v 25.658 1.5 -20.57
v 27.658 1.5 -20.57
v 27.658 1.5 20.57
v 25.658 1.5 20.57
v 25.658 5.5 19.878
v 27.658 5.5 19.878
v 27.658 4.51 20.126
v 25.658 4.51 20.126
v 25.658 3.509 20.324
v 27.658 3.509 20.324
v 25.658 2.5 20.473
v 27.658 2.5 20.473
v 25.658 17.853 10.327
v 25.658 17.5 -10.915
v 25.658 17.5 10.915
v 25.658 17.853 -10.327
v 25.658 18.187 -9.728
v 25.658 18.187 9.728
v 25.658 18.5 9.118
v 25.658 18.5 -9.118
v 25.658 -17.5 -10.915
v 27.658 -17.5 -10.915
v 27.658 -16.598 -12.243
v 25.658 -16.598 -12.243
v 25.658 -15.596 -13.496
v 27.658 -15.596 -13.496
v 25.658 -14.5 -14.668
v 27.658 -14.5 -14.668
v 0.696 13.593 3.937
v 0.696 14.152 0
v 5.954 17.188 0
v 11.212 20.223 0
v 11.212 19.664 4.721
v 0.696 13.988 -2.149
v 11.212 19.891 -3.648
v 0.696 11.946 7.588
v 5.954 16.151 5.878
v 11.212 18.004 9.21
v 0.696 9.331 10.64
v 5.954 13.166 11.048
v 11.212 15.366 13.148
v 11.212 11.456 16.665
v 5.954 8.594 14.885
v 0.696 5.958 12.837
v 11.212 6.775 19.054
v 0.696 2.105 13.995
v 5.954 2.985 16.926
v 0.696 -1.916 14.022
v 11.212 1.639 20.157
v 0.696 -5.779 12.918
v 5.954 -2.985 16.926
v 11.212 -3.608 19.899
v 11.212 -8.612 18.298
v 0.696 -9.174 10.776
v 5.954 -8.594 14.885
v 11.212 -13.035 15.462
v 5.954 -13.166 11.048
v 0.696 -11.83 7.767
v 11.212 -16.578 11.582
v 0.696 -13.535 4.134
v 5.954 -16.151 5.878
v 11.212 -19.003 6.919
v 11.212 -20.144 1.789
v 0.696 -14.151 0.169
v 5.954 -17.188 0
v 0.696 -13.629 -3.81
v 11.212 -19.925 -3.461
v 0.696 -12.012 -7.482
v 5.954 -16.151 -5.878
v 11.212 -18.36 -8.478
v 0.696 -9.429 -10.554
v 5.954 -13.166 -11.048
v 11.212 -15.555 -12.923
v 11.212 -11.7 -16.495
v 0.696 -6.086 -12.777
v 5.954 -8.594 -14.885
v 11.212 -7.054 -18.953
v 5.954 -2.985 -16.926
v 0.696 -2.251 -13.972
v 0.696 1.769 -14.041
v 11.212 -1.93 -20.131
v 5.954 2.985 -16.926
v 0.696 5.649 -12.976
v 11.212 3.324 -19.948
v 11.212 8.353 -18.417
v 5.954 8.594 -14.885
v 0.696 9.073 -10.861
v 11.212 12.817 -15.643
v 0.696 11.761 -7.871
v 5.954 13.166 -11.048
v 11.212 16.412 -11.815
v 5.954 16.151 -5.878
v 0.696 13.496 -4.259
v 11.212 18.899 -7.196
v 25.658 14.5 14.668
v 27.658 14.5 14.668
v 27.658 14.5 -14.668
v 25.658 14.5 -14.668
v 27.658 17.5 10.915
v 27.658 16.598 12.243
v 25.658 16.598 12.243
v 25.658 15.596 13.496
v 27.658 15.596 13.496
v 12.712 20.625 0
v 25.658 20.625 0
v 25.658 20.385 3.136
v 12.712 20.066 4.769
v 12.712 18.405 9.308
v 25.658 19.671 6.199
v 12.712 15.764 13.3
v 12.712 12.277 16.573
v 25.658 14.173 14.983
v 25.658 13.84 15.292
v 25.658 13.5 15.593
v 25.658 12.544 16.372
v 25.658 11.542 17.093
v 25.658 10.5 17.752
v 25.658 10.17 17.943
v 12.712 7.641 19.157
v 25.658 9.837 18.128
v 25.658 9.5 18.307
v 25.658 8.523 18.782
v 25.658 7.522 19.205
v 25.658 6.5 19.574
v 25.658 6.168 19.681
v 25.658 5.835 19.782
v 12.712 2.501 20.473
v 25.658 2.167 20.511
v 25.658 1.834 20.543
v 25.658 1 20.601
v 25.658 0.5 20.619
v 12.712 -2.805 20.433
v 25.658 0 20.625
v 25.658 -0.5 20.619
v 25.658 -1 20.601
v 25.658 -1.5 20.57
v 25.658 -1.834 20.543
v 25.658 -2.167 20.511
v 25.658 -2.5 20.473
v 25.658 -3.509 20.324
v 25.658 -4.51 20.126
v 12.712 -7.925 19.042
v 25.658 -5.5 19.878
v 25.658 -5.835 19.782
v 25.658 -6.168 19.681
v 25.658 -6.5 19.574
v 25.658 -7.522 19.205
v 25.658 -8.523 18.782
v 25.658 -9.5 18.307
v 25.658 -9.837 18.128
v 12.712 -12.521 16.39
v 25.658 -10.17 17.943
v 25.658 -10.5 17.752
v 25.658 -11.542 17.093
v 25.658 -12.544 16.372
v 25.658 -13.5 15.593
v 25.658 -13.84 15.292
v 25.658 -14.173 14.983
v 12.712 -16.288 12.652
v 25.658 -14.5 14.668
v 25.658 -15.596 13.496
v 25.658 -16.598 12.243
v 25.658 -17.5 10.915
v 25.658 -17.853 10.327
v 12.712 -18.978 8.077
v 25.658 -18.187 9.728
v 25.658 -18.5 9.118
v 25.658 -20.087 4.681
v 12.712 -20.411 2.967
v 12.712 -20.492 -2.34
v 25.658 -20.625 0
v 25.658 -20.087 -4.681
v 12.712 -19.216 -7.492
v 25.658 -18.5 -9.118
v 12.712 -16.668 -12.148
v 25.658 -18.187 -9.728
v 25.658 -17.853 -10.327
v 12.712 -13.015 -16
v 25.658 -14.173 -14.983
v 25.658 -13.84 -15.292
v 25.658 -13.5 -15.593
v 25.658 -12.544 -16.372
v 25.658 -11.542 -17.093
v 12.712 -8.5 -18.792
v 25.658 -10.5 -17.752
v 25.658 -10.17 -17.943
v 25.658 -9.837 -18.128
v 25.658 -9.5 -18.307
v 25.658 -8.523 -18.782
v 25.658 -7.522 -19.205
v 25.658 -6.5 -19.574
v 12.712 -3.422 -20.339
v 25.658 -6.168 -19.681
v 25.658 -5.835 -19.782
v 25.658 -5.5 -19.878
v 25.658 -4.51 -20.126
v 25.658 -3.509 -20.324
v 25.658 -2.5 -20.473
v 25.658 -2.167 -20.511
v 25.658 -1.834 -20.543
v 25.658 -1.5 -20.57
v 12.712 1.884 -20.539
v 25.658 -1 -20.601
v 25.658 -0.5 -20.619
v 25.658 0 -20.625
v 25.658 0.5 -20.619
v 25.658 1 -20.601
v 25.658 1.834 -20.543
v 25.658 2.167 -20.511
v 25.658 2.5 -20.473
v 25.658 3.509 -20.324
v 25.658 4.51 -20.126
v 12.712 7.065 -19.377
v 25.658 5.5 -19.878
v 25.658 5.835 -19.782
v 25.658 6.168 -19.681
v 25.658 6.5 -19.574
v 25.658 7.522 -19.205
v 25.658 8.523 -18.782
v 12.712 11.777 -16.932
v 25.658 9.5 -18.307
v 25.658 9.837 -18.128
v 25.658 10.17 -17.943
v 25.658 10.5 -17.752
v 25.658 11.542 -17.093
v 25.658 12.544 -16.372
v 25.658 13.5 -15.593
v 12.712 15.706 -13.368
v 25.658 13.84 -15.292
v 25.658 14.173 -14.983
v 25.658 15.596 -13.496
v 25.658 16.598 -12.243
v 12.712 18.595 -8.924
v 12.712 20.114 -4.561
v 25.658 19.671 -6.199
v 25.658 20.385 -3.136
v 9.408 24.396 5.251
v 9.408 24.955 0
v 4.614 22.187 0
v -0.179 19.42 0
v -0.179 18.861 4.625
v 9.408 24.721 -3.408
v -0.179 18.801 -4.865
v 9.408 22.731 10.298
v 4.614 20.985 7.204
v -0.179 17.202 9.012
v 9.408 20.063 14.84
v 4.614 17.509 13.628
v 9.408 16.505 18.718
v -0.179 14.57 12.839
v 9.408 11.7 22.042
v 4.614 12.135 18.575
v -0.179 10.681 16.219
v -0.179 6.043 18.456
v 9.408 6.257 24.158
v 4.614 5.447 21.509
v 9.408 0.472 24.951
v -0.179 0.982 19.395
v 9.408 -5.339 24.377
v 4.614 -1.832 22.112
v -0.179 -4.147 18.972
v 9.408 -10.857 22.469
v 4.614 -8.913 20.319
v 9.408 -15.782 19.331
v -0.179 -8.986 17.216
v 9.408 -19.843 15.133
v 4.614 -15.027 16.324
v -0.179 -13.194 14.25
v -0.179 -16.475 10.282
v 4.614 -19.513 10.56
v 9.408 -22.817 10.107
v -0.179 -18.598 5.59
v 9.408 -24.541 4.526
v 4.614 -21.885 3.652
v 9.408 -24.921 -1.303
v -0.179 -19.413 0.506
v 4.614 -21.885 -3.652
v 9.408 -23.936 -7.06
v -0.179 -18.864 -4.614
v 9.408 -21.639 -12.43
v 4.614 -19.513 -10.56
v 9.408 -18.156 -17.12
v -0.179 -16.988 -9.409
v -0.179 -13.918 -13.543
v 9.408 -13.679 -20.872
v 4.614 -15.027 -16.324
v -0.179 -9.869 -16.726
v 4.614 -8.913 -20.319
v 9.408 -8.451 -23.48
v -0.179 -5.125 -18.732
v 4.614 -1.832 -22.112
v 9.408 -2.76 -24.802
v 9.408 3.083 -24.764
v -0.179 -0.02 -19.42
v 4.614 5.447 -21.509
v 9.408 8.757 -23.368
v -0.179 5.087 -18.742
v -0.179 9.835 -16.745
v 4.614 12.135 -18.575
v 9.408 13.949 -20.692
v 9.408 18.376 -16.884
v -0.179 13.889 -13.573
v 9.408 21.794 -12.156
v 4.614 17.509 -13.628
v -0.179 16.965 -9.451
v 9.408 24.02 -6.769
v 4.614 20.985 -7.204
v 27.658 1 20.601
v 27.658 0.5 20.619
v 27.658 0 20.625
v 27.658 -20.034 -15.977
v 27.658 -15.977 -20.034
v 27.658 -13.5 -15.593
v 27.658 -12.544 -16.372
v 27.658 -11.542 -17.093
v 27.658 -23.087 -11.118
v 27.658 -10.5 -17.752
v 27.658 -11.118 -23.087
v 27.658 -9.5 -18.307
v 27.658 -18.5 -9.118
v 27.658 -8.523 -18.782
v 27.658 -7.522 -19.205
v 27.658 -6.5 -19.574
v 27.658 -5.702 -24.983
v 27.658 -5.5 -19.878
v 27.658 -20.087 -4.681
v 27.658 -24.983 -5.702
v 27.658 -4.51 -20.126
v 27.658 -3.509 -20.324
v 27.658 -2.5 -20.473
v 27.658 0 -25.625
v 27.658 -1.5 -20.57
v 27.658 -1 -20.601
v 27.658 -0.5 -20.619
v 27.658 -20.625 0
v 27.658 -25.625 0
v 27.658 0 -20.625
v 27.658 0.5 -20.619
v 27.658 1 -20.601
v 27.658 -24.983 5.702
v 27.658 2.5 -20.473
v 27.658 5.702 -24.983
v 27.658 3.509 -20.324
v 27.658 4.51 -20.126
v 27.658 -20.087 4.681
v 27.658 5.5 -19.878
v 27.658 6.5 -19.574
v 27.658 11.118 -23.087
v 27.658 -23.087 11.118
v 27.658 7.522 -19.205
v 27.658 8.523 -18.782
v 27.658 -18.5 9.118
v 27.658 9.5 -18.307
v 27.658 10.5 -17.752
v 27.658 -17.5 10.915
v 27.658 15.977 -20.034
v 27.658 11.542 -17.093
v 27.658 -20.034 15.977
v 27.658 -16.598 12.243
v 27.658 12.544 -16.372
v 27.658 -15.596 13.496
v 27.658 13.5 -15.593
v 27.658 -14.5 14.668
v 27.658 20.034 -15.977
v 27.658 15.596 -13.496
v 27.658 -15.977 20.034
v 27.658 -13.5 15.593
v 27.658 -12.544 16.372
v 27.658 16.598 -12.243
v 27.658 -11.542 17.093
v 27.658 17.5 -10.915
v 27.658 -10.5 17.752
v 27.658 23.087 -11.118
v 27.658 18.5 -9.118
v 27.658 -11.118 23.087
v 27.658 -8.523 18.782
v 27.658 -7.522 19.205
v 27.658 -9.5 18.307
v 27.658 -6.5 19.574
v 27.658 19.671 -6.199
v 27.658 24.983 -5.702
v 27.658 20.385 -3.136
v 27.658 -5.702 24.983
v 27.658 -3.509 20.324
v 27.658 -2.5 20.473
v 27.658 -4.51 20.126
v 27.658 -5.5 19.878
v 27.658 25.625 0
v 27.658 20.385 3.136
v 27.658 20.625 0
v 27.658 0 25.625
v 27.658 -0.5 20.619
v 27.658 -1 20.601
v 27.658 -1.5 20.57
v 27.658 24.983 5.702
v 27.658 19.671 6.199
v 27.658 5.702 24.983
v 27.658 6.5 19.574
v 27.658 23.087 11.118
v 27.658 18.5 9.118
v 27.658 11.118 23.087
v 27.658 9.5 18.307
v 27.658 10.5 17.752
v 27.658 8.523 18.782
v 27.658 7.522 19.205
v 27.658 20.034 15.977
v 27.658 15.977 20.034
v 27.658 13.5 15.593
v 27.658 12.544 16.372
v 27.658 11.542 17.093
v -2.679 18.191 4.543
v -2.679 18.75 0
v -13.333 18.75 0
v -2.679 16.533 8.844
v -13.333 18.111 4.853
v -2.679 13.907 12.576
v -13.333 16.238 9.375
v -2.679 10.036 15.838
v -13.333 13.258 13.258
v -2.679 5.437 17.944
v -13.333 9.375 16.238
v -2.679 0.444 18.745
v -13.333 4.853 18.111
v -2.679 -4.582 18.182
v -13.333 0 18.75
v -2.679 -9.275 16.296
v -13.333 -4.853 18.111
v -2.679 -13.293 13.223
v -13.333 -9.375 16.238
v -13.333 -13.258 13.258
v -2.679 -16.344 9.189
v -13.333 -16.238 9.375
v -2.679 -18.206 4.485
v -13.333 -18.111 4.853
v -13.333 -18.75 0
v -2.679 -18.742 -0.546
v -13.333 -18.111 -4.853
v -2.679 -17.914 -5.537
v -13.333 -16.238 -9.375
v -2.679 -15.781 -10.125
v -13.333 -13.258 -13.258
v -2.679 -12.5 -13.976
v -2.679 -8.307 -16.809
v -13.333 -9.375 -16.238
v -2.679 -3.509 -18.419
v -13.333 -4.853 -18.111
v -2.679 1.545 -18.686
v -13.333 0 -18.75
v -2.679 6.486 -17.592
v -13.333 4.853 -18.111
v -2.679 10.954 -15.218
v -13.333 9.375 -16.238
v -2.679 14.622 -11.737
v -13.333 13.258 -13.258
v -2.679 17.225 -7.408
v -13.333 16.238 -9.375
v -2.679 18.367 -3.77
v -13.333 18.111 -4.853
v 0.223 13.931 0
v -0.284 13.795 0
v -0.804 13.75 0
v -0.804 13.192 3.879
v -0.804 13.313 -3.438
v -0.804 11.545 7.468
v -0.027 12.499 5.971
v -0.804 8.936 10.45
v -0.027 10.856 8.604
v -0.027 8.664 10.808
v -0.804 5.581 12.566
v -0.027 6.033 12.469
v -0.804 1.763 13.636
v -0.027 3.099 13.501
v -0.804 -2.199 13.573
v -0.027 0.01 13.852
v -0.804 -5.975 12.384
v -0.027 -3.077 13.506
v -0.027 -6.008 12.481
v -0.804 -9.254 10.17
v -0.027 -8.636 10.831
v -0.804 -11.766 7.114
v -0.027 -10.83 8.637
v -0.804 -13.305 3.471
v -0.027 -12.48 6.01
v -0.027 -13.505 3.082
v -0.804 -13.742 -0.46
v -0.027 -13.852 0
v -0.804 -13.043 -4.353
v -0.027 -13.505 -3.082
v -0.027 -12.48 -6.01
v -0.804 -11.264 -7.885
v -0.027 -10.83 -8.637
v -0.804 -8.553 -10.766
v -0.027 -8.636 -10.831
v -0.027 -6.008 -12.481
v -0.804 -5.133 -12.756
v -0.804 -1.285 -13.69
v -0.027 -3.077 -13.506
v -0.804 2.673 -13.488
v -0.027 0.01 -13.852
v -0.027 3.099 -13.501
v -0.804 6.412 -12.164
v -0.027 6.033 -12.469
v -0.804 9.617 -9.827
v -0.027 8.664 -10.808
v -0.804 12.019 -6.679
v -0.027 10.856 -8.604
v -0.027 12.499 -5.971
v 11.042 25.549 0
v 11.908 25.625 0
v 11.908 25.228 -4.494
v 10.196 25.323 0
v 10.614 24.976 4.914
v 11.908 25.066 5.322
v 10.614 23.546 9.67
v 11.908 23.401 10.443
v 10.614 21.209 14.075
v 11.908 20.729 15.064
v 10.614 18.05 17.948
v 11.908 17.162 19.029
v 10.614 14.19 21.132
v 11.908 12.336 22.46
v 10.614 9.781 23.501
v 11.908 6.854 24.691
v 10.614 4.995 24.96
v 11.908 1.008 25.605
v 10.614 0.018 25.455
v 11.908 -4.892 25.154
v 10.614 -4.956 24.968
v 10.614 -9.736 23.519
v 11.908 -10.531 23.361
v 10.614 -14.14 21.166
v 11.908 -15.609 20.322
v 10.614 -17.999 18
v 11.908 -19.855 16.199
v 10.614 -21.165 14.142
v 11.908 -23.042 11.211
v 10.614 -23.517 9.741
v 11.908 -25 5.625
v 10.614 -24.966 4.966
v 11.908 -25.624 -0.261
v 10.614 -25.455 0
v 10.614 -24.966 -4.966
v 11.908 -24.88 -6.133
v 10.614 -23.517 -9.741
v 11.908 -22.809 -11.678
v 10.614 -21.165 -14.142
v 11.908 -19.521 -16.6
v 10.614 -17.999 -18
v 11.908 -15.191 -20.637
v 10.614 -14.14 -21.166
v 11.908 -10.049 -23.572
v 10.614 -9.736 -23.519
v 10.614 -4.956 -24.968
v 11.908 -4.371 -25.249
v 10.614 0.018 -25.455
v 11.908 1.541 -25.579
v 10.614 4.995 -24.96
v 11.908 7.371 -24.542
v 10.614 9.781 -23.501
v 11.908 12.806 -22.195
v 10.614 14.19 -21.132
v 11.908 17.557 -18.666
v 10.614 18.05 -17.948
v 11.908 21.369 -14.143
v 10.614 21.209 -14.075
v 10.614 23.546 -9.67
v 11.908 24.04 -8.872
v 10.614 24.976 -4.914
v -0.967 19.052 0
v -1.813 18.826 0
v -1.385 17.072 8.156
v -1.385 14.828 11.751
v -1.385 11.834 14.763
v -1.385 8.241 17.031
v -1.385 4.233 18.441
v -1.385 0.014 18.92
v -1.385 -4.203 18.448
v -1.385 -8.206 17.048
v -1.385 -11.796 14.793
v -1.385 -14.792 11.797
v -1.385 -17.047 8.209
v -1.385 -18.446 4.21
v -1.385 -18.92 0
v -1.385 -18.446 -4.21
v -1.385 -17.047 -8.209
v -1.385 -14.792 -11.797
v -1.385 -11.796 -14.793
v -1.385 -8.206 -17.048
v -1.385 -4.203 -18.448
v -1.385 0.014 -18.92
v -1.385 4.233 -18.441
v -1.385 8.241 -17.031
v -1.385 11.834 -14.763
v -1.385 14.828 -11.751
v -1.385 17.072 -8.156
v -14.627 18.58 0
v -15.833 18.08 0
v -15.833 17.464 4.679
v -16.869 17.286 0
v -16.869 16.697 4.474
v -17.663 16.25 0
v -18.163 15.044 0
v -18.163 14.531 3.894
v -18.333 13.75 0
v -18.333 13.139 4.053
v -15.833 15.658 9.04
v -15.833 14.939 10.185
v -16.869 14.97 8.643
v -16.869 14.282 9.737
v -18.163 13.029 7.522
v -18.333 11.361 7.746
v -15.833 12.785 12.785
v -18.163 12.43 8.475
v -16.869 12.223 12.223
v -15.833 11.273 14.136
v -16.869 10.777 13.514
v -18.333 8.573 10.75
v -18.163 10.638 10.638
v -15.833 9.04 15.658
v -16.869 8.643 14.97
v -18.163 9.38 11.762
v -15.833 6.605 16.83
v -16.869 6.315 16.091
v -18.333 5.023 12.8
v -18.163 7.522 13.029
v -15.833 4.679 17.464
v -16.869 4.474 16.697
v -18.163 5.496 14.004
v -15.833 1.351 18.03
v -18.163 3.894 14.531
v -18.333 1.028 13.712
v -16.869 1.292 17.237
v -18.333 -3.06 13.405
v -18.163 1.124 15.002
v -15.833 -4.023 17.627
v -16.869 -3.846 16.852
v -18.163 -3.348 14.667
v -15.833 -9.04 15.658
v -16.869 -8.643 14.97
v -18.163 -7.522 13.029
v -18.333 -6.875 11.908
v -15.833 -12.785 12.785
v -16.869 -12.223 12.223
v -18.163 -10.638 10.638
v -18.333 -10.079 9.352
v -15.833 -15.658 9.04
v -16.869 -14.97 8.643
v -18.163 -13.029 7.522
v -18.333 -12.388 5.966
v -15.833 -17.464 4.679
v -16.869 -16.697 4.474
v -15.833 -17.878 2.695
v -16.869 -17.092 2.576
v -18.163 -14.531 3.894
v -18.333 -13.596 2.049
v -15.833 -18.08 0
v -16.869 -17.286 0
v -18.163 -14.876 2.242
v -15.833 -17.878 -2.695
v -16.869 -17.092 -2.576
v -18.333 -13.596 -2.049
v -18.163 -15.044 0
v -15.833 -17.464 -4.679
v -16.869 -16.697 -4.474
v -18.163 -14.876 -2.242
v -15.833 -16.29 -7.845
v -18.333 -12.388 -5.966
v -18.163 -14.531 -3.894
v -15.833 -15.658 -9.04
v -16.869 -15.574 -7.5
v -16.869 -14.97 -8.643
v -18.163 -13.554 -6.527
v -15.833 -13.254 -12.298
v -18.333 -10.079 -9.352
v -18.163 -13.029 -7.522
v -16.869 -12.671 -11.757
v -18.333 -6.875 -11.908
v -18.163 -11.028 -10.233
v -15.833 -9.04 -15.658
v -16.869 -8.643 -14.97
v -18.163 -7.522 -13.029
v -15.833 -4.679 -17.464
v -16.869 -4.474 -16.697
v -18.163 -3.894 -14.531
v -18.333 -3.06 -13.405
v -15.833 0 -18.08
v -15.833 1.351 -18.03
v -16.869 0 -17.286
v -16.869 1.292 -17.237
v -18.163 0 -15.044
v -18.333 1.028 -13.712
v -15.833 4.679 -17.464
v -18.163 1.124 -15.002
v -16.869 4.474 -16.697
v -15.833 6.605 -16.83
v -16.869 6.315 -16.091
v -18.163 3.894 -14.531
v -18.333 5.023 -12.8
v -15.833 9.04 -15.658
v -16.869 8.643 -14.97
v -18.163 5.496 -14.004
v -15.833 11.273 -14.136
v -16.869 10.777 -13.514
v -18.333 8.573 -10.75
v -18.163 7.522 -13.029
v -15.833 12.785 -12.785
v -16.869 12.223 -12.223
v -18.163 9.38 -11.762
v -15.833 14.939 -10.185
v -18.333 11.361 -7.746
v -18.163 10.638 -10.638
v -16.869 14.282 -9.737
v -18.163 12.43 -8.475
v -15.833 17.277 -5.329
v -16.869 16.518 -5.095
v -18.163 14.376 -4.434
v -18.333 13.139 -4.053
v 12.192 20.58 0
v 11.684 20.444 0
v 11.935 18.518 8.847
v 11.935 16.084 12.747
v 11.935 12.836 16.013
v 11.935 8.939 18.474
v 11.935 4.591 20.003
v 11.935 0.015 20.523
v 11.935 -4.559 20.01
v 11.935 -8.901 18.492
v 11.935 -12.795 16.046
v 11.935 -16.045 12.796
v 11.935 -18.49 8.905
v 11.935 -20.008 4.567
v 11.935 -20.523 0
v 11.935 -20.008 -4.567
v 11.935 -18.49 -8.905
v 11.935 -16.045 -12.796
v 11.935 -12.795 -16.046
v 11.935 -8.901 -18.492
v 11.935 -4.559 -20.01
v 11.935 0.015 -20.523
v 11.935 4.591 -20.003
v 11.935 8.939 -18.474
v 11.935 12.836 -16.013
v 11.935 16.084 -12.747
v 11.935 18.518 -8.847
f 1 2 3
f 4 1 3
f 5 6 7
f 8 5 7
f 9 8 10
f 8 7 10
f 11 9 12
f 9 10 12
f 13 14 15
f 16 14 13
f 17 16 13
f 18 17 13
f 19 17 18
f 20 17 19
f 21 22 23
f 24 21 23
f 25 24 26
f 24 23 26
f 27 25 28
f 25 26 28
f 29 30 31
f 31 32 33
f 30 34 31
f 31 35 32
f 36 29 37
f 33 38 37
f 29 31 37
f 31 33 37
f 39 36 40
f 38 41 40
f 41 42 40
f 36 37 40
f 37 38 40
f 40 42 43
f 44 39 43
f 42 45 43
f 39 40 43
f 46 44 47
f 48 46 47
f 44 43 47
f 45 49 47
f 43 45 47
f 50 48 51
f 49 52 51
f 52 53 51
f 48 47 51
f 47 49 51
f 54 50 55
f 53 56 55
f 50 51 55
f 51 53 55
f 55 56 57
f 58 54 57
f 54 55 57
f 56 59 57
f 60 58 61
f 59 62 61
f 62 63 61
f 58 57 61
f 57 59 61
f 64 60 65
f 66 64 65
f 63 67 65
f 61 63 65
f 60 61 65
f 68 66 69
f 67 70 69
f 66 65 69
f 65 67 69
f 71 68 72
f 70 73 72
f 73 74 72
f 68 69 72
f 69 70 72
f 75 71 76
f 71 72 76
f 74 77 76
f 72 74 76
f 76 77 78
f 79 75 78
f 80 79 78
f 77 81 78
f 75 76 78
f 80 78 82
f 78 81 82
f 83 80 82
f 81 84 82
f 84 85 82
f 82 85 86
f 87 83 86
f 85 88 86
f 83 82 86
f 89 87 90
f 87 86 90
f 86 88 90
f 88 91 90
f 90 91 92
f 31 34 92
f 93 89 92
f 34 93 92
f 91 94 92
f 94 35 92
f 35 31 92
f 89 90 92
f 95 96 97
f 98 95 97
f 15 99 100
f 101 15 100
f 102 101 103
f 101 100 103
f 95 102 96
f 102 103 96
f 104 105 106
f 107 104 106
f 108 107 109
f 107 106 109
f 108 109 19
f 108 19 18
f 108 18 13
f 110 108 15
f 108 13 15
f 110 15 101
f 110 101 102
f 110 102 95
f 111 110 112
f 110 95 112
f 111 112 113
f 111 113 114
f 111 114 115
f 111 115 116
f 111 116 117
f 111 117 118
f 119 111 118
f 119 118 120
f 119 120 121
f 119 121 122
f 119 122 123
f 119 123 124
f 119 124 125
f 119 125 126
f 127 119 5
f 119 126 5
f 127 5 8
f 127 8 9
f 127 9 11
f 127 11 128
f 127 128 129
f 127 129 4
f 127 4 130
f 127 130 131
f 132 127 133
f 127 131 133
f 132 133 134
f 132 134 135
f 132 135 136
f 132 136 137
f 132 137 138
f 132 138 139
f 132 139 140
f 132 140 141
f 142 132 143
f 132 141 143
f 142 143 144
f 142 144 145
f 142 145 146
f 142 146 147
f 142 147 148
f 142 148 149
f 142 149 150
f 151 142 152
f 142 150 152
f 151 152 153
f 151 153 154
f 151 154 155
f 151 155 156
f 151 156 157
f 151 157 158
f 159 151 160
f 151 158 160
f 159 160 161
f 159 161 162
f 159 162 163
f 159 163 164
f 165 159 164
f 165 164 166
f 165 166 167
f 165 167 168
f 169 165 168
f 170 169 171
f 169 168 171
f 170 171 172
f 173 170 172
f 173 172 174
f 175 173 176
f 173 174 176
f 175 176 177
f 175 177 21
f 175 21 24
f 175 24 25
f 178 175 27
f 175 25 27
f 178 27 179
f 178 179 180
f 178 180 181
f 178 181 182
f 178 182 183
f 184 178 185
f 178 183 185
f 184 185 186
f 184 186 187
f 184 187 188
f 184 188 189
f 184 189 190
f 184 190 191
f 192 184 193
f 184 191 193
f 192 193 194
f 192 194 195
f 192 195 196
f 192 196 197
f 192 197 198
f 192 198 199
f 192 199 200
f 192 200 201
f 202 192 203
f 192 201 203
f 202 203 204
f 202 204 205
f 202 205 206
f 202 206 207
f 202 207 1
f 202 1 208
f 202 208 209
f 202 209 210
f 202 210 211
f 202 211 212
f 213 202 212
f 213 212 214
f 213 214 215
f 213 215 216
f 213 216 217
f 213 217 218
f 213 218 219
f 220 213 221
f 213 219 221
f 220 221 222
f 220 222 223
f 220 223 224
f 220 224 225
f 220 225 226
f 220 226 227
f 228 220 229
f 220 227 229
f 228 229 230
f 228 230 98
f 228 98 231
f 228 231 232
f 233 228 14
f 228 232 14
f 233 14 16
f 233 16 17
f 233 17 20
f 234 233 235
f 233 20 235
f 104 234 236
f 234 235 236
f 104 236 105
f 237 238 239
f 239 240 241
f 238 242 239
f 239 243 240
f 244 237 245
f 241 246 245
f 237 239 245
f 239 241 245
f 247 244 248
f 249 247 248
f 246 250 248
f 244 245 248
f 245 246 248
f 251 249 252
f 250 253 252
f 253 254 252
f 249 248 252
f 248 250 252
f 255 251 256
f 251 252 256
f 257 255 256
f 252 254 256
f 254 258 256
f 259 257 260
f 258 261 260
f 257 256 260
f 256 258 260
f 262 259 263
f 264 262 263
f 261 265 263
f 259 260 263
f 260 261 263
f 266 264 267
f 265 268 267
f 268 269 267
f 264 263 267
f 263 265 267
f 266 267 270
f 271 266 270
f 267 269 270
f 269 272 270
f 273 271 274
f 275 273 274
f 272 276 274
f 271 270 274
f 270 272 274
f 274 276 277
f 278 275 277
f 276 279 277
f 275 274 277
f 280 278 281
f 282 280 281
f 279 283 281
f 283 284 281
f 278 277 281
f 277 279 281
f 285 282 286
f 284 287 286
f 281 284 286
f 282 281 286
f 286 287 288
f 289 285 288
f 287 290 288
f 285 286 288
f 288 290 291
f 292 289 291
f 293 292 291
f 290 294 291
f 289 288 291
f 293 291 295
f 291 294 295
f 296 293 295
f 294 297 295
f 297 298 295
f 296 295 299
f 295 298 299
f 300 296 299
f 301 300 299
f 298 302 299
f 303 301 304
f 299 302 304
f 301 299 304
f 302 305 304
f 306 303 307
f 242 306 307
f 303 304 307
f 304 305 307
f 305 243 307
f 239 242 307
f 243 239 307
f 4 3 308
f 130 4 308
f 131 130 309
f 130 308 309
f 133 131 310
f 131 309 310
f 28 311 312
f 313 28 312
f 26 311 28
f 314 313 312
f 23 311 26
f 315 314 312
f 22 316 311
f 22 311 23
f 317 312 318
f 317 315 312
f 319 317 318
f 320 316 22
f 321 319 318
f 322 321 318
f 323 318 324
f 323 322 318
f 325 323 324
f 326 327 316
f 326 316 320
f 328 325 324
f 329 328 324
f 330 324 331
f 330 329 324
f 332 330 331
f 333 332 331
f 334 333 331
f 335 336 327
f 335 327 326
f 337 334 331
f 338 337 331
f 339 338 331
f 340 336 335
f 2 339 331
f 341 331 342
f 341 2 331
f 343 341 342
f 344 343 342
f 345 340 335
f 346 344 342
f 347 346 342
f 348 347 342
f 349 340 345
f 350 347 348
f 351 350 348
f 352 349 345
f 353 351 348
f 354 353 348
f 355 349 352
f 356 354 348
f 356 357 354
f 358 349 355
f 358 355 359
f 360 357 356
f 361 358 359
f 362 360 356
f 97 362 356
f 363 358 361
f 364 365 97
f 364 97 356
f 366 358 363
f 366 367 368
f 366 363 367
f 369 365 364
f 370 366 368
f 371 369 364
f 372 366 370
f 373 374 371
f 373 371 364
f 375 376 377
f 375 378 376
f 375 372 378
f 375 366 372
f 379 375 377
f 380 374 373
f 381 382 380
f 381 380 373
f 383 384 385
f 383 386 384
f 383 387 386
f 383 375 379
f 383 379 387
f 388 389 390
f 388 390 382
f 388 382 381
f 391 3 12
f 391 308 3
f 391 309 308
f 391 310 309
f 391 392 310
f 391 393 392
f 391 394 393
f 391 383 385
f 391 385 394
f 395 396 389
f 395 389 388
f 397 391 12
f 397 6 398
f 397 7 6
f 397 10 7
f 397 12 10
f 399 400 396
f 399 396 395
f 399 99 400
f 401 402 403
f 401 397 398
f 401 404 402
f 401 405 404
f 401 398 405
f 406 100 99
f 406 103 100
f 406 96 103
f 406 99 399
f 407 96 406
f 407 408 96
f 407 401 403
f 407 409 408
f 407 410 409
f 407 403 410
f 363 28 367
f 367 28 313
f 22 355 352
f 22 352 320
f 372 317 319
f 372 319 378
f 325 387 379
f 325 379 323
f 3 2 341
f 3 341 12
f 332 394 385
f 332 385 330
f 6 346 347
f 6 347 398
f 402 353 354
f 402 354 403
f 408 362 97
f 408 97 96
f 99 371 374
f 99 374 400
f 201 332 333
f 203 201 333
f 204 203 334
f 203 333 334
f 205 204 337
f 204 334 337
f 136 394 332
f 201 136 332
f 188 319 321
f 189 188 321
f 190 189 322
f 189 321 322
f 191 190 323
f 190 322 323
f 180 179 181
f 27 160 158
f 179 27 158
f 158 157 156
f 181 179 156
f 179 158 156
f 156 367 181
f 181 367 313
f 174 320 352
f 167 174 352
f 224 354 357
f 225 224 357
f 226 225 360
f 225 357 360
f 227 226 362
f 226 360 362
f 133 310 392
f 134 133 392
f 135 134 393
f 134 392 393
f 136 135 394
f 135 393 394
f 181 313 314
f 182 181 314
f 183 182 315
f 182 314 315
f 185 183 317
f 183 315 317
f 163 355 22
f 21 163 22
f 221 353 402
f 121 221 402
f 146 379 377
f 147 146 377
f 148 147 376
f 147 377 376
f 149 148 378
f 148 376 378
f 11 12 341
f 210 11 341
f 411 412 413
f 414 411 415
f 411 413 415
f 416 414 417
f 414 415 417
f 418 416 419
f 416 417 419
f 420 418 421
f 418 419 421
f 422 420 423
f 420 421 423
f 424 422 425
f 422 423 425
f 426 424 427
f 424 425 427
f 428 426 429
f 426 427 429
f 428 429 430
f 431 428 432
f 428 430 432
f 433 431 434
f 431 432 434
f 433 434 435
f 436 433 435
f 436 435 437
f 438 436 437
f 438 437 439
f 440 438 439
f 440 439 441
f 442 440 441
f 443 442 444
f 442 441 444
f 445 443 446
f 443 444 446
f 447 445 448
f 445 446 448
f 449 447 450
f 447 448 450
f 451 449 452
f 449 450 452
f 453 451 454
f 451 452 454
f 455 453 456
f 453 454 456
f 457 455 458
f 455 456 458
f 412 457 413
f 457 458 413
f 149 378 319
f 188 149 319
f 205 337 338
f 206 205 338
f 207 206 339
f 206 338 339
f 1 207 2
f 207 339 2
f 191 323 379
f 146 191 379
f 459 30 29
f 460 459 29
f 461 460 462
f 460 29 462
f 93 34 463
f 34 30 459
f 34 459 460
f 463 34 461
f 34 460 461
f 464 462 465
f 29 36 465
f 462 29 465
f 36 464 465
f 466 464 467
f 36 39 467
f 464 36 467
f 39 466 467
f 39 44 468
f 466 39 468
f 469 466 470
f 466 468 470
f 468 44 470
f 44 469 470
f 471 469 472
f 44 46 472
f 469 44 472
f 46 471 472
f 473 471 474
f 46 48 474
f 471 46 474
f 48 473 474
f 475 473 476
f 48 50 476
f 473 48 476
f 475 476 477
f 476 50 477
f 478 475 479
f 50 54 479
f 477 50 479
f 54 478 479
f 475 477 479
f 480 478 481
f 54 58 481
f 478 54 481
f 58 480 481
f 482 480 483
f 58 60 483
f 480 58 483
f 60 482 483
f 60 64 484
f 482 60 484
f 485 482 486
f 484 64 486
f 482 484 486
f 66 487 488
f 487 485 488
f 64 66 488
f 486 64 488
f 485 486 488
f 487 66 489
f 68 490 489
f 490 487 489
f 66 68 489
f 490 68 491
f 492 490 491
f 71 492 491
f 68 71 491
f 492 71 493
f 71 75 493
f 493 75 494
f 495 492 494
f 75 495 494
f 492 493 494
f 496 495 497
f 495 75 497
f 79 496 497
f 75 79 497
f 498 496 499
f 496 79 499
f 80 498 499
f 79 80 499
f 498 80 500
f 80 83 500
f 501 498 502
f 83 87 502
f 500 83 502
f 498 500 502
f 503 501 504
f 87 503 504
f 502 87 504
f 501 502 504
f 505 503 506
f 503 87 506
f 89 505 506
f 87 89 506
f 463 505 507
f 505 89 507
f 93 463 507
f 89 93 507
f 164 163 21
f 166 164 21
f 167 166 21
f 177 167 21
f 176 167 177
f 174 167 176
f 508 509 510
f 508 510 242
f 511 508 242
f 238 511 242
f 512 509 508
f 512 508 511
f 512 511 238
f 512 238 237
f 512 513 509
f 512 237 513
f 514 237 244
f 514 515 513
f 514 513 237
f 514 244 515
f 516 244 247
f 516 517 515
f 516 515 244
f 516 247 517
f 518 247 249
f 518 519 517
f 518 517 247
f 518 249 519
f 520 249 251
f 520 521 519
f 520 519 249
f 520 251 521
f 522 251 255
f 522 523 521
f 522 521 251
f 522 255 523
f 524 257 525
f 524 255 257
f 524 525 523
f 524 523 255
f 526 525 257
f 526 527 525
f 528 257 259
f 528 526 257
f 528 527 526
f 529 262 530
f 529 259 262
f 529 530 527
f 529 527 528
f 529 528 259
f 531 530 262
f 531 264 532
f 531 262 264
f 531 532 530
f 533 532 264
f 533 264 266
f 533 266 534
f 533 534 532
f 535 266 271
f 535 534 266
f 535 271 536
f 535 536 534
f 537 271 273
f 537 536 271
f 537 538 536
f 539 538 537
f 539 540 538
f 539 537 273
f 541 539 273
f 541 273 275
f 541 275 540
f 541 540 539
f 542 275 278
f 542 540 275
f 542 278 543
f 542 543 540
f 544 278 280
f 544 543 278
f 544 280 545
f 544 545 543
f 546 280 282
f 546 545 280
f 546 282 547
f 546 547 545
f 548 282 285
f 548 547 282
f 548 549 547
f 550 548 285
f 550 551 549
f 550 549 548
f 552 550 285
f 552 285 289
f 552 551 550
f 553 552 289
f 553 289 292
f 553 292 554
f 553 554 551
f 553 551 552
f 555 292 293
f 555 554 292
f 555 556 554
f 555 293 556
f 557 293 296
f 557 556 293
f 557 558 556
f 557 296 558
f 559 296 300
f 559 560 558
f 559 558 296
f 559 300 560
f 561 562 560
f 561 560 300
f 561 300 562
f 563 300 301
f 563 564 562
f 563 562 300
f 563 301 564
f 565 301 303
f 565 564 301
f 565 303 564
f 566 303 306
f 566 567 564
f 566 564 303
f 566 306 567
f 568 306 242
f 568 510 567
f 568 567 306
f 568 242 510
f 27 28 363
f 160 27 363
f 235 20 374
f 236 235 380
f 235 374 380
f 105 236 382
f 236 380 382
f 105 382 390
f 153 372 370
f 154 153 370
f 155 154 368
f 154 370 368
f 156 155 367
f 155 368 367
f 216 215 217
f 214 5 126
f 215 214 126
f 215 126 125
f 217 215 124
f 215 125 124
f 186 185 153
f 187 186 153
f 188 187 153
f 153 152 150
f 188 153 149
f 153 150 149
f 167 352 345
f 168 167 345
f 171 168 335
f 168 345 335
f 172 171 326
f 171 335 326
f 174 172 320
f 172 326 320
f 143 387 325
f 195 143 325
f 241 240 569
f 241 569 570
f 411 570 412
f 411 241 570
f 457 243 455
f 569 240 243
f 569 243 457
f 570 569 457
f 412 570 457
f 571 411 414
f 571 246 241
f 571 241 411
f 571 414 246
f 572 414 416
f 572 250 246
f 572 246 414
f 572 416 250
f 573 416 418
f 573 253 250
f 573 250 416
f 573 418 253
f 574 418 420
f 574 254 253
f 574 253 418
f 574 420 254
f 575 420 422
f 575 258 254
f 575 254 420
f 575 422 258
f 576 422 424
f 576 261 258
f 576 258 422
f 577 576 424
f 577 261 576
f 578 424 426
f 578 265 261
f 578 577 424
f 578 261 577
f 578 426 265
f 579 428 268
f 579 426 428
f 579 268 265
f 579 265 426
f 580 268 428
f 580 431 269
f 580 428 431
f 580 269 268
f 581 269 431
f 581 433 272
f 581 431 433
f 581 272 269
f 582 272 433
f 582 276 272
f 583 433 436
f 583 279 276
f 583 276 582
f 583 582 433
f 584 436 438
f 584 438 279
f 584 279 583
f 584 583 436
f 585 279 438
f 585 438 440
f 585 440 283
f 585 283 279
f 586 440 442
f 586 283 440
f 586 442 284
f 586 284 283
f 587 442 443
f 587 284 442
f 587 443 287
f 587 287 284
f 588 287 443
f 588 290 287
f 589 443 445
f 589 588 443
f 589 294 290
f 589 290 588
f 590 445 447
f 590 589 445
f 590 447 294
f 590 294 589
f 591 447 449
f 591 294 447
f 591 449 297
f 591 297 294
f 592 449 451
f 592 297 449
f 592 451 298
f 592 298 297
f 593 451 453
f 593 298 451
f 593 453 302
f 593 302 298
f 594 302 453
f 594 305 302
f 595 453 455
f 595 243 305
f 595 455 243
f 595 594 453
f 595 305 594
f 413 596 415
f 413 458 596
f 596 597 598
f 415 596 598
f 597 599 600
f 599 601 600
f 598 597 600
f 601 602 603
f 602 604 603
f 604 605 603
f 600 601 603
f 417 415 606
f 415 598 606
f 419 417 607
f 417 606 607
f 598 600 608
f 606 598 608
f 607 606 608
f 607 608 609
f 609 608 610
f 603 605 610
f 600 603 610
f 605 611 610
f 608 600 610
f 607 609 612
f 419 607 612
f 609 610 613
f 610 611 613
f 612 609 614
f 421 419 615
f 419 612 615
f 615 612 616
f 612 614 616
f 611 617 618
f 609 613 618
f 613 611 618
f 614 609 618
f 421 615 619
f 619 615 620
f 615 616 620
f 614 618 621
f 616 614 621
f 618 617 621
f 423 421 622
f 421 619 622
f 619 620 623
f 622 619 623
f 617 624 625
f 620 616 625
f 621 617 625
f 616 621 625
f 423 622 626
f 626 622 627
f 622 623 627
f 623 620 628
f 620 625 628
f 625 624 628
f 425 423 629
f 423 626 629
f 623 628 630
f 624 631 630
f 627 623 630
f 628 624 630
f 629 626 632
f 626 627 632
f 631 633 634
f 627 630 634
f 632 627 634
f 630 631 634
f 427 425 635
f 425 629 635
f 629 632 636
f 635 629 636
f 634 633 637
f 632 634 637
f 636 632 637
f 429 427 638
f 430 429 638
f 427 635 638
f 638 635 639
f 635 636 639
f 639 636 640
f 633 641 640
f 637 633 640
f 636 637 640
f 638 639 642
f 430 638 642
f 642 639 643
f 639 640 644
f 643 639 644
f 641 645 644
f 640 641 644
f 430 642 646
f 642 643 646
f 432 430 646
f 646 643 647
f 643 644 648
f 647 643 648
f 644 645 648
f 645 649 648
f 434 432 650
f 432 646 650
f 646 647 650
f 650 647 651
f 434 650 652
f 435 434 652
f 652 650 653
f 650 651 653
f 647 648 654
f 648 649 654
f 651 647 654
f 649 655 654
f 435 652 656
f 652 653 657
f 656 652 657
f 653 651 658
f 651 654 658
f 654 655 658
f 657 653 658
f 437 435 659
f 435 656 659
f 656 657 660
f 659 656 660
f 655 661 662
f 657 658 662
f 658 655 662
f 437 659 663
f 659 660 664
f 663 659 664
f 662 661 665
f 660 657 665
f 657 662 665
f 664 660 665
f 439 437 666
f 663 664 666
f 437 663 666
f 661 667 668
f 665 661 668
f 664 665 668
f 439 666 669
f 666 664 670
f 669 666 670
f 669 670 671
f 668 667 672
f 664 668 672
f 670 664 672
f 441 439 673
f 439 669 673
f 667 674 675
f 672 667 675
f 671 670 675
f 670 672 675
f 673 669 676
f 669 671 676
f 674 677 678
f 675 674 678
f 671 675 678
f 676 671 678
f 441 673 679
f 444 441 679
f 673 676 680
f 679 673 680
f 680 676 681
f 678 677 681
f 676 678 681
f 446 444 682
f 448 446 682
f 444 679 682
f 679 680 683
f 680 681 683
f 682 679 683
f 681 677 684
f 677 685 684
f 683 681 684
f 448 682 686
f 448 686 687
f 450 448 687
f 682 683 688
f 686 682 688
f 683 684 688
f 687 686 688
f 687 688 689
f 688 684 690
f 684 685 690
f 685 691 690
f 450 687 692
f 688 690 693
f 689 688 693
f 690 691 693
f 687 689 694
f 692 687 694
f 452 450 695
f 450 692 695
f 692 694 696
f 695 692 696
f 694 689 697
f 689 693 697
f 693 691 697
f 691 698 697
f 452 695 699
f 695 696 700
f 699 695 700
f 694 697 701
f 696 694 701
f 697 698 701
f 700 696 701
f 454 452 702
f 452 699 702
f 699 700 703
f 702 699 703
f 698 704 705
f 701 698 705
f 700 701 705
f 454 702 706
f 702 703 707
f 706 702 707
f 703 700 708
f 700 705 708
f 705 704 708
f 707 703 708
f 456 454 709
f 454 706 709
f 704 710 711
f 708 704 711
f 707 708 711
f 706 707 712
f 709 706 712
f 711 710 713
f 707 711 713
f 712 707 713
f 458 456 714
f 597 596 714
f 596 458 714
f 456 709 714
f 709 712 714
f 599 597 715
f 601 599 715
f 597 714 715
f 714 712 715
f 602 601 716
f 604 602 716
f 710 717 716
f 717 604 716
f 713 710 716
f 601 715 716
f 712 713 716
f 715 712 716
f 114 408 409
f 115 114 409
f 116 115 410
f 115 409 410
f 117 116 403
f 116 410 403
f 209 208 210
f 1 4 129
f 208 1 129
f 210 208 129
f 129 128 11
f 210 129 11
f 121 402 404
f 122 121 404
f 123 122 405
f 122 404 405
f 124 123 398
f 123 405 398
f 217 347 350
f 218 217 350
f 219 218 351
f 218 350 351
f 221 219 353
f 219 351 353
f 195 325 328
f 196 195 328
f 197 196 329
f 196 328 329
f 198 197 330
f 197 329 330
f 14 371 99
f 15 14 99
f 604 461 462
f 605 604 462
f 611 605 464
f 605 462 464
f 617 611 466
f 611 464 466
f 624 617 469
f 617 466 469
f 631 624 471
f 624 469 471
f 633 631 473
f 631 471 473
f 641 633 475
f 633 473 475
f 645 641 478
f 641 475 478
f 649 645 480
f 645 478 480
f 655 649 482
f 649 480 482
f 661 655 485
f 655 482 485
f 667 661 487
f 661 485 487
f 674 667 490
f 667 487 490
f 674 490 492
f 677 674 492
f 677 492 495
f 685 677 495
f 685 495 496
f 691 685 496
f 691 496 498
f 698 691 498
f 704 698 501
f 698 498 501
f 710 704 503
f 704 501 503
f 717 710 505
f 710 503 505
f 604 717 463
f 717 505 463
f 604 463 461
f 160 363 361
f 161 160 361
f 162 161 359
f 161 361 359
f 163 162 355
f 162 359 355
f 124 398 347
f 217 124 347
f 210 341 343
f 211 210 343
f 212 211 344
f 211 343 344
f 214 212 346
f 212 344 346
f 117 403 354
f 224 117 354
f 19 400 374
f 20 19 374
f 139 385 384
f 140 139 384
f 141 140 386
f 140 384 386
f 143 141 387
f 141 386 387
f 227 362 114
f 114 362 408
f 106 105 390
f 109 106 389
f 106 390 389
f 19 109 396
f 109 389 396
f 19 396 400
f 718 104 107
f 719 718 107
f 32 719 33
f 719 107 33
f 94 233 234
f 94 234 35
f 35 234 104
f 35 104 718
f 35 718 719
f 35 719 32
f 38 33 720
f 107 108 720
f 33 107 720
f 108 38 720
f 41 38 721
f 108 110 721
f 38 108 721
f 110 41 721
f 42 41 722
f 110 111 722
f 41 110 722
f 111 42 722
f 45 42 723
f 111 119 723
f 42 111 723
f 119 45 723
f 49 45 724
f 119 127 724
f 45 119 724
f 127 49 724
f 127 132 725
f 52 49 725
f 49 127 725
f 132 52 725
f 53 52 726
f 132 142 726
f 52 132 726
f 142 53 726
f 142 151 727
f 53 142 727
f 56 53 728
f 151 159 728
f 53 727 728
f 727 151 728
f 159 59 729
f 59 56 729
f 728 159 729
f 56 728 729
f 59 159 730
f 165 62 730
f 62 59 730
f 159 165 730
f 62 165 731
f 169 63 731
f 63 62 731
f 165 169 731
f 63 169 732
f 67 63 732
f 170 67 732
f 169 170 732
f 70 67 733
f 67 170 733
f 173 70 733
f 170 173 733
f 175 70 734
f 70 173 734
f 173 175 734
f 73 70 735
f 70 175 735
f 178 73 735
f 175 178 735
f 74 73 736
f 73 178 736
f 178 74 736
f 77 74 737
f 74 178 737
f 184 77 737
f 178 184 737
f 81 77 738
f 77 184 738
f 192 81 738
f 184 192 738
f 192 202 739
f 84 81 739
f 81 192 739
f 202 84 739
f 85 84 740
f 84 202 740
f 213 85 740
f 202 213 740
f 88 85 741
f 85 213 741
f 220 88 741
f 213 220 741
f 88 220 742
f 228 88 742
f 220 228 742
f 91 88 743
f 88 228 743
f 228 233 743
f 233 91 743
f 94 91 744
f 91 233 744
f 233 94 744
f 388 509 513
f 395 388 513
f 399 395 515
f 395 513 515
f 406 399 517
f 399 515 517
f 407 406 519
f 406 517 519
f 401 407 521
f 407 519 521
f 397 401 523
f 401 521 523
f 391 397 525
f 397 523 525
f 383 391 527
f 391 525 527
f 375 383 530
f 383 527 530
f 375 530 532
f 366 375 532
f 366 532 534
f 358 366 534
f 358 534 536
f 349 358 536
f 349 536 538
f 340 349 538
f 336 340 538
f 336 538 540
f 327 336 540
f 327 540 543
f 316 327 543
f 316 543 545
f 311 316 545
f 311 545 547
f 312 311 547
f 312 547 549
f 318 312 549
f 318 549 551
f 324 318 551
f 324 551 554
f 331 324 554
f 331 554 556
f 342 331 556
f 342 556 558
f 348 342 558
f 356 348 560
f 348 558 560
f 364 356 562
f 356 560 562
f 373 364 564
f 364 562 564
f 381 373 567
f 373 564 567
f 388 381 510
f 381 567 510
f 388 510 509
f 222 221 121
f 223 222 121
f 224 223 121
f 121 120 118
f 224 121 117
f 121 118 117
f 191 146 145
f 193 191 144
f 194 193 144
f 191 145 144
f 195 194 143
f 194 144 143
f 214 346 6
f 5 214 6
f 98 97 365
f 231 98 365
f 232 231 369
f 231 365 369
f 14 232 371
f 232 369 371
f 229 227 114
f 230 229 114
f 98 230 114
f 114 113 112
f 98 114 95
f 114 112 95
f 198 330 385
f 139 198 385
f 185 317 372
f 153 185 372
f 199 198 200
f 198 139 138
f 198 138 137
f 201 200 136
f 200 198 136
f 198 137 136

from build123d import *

# Parameters (mm, degrees)
F2_R     = 25.625
F3_DEPTH = 2
F5_DEPTH = 2
F6_R     = 4.99999
F7_R     = 3


# Not quite as in the source:
# - a fillet or chamfer is up to 0.001 mm smaller than in the source, because OpenCascade refuses the exact size


with BuildPart() as f1:
    # F0 (on Top) → F1 (revolve)
    with BuildSketch(Plane.XY):
        Polygon((-18.3333333333, 18.75), (-18.3333333333, 13.75), (0, 13.75), (11.907849302, 20.625), (25.657849302, 20.625), (25.657849302, 25.625), (10.5681033399, 25.625), (-1.3397459622, 18.75), align=None)
    revolve(axis=Axis((-8.7595172226, 0, 0), (1, 0, 0)))

    # F2 (on face) → F3 (join)
    with BuildSketch(Plane.YZ.offset(25.657849302)):
        Circle(F2_R)
    extrude(amount=F3_DEPTH)

    # F4 (on face) → F5 (cut, through all)
    with BuildSketch(Plane.YZ.offset(27.657849302)):
        with BuildLine():
            ThreePointArc((20.625, 0), (20.0867260274, 4.6812458278), (18.5, 9.1181481124))
            Line((18.5, 9.1181481124), (18.5, -9.1181481124))
            ThreePointArc((18.5, -9.1181481124), (20.0867260274, -4.6812458278), (20.625, 0))
        make_face()
        with BuildLine():
            ThreePointArc((17.5, 10.9151557479), (16.1096351924, 12.8790635905), (14.5, 14.6676727875))
            Line((14.5, 14.6676727875), (14.5, -14.6676727875))
            ThreePointArc((14.5, -14.6676727875), (16.1096351924, -12.8790635905), (17.5, -10.9151557479))
            Line((17.5, -10.9151557479), (17.5, 10.9151557479))
        make_face()
        with BuildLine():
            ThreePointArc((13.5, 15.5929671647), (12.0484676296, 16.7399239179), (10.5, 17.7522005678))
            Line((10.5, 17.7522005678), (10.5, -17.7522005678))
            ThreePointArc((10.5, -17.7522005678), (12.0484676296, -16.7399239179), (13.5, -15.5929671647))
            Line((13.5, -15.5929671647), (13.5, 15.5929671647))
        make_face()
        with BuildLine():
            ThreePointArc((9.5, 18.3068463969), (8.0250486473, 18.9997162929), (6.5, 19.573978262))
            Line((6.5, 19.573978262), (6.5, -19.573978262))
            ThreePointArc((6.5, -19.573978262), (8.0250486473, -18.9997162929), (9.5, -18.3068463969))
            Line((9.5, -18.3068463969), (9.5, 18.3068463969))
        make_face()
        with BuildLine():
            ThreePointArc((5.5, 19.8781444054), (4.0110398588, 20.2312180615), (2.5, 20.4729241927))
            Line((2.5, 20.4729241927), (2.5, -20.4729241927))
            ThreePointArc((2.5, -20.4729241927), (4.0110398588, -20.2312180615), (5.5, -19.8781444054))
            Line((5.5, -19.8781444054), (5.5, 19.8781444054))
        make_face()
        with BuildLine():
            ThreePointArc((1.5, 20.5703822279), (0.7504970188, 20.6113410341), (0, 20.625))
            ThreePointArc((0, 20.625), (-0.7504970188, 20.6113410341), (-1.5, 20.5703822279))
            Line((-1.5, 20.5703822279), (-1.5, -20.5703822279))
            ThreePointArc((-1.5, -20.5703822279), (-0.7504970188, -20.6113410341), (0, -20.625))
            ThreePointArc((0, -20.625), (0.7504970188, -20.6113410341), (1.5, -20.5703822279))
            Line((1.5, -20.5703822279), (1.5, 20.5703822279))
        make_face()
        with BuildLine():
            Line((-2.5, -20.4729241927), (-2.5, 20.4729241927))
            ThreePointArc((-2.5, 20.4729241927), (-4.0110398588, 20.2312180615), (-5.5, 19.8781444054))
            Line((-5.5, 19.8781444054), (-5.5, -19.8781444054))
            ThreePointArc((-5.5, -19.8781444054), (-4.0110398588, -20.2312180615), (-2.5, -20.4729241927))
        make_face()
        with BuildLine():
            Line((-6.5, -19.573978262), (-6.5, 19.573978262))
            ThreePointArc((-6.5, 19.573978262), (-8.0250486473, 18.9997162929), (-9.5, 18.3068463969))
            Line((-9.5, 18.3068463969), (-9.5, -18.3068463969))
            ThreePointArc((-9.5, -18.3068463969), (-8.0250486473, -18.9997162929), (-6.5, -19.573978262))
        make_face()
        with BuildLine():
            Line((-10.5, -17.7522005678), (-10.5, 17.7522005678))
            ThreePointArc((-10.5, 17.7522005678), (-12.0484676296, 16.7399239179), (-13.5, 15.5929671647))
            Line((-13.5, 15.5929671647), (-13.5, -15.5929671647))
            ThreePointArc((-13.5, -15.5929671647), (-12.0484676296, -16.7399239179), (-10.5, -17.7522005678))
        make_face()
        with BuildLine():
            Line((-14.5, -14.6676727875), (-14.5, 14.6676727875))
            ThreePointArc((-14.5, 14.6676727875), (-16.1096351924, 12.8790635905), (-17.5, 10.9151557479))
            Line((-17.5, 10.9151557479), (-17.5, -10.9151557479))
            ThreePointArc((-17.5, -10.9151557479), (-16.1096351924, -12.8790635905), (-14.5, -14.6676727875))
        make_face()
        with BuildLine():
            Line((-18.5, -9.1181481124), (-18.5, 9.1181481124))
            ThreePointArc((-18.5, 9.1181481124), (-20.625, 0), (-18.5, -9.1181481124))
        make_face()
    extrude(amount=-F5_DEPTH, mode=Mode.SUBTRACT)

    # F6 (radius 5 in the source; OpenCascade refuses exactly that, so slightly less here)
    f6_edges = [f1.edges().sort_by_distance(p)[0] for p in [
        (-18.333333, -18.75, 0),
        (-1.339746, -18.75, 0),
        (10.568103, -25.625, 0),
    ]]
    fillet(f6_edges, radius=F6_R)

    # F7
    f7_edges = [f1.edges().sort_by_distance(p)[0] for p in [
        (11.907849, -20.625, 0),
        (0, -13.75, 0),
    ]]
    fillet(f7_edges, radius=F7_R)


solid = f1.part
